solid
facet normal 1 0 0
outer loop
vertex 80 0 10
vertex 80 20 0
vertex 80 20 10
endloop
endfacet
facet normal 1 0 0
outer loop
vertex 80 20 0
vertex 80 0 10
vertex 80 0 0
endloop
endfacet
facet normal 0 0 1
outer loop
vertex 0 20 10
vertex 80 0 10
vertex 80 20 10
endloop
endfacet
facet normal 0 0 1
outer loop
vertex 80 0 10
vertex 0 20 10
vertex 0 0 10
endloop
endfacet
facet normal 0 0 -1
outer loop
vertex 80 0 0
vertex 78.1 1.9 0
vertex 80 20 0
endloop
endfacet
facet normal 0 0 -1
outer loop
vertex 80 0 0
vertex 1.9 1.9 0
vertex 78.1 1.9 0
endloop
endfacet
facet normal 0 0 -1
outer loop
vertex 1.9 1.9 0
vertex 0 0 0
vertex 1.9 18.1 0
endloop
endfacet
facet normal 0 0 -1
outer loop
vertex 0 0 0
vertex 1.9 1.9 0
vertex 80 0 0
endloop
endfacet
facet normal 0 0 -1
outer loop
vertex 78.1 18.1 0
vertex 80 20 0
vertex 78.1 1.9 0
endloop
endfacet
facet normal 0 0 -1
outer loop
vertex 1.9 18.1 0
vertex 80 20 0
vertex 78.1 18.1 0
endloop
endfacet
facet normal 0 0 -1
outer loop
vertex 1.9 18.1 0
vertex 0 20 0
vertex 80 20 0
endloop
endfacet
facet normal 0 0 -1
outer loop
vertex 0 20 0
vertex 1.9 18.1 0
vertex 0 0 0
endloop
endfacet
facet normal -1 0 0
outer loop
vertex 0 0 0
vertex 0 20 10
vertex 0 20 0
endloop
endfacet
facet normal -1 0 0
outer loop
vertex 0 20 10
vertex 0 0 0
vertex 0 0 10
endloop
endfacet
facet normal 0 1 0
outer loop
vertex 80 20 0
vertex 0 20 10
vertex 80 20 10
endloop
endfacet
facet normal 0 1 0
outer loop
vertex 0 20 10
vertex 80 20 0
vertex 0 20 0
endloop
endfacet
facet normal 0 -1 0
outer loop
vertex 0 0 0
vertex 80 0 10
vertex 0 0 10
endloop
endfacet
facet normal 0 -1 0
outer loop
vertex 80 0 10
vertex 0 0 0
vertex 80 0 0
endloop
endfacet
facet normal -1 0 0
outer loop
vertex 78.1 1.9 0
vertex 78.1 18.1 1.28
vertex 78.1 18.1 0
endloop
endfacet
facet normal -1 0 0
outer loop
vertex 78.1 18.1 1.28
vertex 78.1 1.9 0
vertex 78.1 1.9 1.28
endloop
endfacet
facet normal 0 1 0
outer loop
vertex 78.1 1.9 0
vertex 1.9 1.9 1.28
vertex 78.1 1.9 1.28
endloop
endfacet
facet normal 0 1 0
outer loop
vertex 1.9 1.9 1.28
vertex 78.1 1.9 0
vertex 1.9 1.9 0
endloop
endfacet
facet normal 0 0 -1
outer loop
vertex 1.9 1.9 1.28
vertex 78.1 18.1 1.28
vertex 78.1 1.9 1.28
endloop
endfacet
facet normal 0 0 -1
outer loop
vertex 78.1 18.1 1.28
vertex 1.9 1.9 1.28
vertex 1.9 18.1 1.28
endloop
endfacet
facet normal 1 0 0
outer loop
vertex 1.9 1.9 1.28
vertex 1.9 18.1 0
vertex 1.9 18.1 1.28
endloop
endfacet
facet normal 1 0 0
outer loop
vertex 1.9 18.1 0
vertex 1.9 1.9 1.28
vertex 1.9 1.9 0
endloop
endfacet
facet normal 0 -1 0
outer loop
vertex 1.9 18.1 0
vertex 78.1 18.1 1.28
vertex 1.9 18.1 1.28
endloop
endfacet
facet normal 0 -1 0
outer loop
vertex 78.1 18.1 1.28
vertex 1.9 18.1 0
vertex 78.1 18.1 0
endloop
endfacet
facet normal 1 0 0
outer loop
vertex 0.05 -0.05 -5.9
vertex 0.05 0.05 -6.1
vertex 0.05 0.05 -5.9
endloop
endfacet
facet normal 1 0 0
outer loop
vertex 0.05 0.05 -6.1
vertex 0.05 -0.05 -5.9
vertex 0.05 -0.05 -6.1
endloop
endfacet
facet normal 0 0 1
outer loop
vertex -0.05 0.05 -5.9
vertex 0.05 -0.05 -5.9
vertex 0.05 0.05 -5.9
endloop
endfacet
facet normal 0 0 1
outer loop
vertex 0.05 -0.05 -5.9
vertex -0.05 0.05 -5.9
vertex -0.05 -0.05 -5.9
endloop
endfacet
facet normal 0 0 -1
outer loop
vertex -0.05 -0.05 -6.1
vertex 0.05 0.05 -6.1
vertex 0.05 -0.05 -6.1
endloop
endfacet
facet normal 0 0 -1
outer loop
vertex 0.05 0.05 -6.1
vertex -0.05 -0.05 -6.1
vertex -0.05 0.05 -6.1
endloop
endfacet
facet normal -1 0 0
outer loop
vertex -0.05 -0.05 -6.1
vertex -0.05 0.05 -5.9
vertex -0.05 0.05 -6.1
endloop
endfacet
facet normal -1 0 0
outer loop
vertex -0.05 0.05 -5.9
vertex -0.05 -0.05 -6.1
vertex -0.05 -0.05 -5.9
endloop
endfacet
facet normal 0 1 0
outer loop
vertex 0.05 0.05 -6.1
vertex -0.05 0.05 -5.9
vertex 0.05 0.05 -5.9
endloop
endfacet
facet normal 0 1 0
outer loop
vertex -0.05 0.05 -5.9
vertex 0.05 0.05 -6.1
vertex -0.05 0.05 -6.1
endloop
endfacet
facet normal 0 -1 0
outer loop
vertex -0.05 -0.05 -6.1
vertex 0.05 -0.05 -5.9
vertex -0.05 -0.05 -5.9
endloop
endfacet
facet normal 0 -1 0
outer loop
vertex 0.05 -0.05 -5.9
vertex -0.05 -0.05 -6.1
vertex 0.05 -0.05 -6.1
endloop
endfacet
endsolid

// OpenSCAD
// file: base-carver.scad
/* This file provides the carve_base() module to hollow-out the base of an object
 * by a given height h, leaving out a border of r thickness.
 *
 * By default the hollowing is cylindric. Optionally, if cylindric=false, the
 * hollowing uses Minkowski with a radius of fn.
 */


module carve_base(h=1.3, r=2, world=1e5, fn=5, cylindric=true) {
    //if(1) children(); else
    if (cylindric) {
       carve_base_cylinder(h, r, world) children();
    }
    else {
       carve_base_minkowski(h, r, world, fn) children();
    }
}


ATOM      = 0.01;


module carve_base_minkowski(h=1.5, r=2.5, world=1e5, fn=4+1) {
    difference() {
        // original
        children();
        
        // shaved foot
        translate([0, 0, -ATOM])
        difference() {
            cylinder(r=world, h=h-ATOM);
            minkowski() {
                difference() {
                    cylinder(r=world, h=h+ATOM);
                    translate([0, 0, -ATOM])
                    intersection() {
                        children();
                        cylinder(r=world, h=h+ATOM);
                    }
                }
                cylinder(r=r, h=ATOM, $fn=fn);
            }
        }
    }
}


module carve_base_cylinder(h=.4, r=2.5, world=1000) {
    difference() {
        // original
        children();
                    
        // shaved foot
        translate([0, 0, -ATOM*2])
        linear_extrude(height=h)
        offset(r=-r)
        projection(cut=true)
        children();
    }
}


intersection() {
    //carve_base_minkowski()
    carve_base(cylindric=true)
    intersection() {
        //translate([0, 0, 3]) sphere(d=10, $fn=64);
        cylinder(d1=10, d2=25, h=6, $fn=40);
    }

    translate([0, -15, -15])
    cube(30);
}
// main file
use <led-lamp-base.scad>
use <base-carver.scad>
CARVE_R = 1.9;

module test1() {
    intersection() {
        translate([43+15, 0, 0]) union() {
            first();
            translate([-20, 0, 0])
            second();
        }
        //if(0) translate([-10, 0, 0])
        cube([80, 100, 17], true);
    }
}

module test2() {
    carve_base(r=CARVE_R)
    cube([80, 20, 10]);
}


test2();


// make flying, forcing support
translate([0, 0, -6]) cube([.1, .1, .2], true);
